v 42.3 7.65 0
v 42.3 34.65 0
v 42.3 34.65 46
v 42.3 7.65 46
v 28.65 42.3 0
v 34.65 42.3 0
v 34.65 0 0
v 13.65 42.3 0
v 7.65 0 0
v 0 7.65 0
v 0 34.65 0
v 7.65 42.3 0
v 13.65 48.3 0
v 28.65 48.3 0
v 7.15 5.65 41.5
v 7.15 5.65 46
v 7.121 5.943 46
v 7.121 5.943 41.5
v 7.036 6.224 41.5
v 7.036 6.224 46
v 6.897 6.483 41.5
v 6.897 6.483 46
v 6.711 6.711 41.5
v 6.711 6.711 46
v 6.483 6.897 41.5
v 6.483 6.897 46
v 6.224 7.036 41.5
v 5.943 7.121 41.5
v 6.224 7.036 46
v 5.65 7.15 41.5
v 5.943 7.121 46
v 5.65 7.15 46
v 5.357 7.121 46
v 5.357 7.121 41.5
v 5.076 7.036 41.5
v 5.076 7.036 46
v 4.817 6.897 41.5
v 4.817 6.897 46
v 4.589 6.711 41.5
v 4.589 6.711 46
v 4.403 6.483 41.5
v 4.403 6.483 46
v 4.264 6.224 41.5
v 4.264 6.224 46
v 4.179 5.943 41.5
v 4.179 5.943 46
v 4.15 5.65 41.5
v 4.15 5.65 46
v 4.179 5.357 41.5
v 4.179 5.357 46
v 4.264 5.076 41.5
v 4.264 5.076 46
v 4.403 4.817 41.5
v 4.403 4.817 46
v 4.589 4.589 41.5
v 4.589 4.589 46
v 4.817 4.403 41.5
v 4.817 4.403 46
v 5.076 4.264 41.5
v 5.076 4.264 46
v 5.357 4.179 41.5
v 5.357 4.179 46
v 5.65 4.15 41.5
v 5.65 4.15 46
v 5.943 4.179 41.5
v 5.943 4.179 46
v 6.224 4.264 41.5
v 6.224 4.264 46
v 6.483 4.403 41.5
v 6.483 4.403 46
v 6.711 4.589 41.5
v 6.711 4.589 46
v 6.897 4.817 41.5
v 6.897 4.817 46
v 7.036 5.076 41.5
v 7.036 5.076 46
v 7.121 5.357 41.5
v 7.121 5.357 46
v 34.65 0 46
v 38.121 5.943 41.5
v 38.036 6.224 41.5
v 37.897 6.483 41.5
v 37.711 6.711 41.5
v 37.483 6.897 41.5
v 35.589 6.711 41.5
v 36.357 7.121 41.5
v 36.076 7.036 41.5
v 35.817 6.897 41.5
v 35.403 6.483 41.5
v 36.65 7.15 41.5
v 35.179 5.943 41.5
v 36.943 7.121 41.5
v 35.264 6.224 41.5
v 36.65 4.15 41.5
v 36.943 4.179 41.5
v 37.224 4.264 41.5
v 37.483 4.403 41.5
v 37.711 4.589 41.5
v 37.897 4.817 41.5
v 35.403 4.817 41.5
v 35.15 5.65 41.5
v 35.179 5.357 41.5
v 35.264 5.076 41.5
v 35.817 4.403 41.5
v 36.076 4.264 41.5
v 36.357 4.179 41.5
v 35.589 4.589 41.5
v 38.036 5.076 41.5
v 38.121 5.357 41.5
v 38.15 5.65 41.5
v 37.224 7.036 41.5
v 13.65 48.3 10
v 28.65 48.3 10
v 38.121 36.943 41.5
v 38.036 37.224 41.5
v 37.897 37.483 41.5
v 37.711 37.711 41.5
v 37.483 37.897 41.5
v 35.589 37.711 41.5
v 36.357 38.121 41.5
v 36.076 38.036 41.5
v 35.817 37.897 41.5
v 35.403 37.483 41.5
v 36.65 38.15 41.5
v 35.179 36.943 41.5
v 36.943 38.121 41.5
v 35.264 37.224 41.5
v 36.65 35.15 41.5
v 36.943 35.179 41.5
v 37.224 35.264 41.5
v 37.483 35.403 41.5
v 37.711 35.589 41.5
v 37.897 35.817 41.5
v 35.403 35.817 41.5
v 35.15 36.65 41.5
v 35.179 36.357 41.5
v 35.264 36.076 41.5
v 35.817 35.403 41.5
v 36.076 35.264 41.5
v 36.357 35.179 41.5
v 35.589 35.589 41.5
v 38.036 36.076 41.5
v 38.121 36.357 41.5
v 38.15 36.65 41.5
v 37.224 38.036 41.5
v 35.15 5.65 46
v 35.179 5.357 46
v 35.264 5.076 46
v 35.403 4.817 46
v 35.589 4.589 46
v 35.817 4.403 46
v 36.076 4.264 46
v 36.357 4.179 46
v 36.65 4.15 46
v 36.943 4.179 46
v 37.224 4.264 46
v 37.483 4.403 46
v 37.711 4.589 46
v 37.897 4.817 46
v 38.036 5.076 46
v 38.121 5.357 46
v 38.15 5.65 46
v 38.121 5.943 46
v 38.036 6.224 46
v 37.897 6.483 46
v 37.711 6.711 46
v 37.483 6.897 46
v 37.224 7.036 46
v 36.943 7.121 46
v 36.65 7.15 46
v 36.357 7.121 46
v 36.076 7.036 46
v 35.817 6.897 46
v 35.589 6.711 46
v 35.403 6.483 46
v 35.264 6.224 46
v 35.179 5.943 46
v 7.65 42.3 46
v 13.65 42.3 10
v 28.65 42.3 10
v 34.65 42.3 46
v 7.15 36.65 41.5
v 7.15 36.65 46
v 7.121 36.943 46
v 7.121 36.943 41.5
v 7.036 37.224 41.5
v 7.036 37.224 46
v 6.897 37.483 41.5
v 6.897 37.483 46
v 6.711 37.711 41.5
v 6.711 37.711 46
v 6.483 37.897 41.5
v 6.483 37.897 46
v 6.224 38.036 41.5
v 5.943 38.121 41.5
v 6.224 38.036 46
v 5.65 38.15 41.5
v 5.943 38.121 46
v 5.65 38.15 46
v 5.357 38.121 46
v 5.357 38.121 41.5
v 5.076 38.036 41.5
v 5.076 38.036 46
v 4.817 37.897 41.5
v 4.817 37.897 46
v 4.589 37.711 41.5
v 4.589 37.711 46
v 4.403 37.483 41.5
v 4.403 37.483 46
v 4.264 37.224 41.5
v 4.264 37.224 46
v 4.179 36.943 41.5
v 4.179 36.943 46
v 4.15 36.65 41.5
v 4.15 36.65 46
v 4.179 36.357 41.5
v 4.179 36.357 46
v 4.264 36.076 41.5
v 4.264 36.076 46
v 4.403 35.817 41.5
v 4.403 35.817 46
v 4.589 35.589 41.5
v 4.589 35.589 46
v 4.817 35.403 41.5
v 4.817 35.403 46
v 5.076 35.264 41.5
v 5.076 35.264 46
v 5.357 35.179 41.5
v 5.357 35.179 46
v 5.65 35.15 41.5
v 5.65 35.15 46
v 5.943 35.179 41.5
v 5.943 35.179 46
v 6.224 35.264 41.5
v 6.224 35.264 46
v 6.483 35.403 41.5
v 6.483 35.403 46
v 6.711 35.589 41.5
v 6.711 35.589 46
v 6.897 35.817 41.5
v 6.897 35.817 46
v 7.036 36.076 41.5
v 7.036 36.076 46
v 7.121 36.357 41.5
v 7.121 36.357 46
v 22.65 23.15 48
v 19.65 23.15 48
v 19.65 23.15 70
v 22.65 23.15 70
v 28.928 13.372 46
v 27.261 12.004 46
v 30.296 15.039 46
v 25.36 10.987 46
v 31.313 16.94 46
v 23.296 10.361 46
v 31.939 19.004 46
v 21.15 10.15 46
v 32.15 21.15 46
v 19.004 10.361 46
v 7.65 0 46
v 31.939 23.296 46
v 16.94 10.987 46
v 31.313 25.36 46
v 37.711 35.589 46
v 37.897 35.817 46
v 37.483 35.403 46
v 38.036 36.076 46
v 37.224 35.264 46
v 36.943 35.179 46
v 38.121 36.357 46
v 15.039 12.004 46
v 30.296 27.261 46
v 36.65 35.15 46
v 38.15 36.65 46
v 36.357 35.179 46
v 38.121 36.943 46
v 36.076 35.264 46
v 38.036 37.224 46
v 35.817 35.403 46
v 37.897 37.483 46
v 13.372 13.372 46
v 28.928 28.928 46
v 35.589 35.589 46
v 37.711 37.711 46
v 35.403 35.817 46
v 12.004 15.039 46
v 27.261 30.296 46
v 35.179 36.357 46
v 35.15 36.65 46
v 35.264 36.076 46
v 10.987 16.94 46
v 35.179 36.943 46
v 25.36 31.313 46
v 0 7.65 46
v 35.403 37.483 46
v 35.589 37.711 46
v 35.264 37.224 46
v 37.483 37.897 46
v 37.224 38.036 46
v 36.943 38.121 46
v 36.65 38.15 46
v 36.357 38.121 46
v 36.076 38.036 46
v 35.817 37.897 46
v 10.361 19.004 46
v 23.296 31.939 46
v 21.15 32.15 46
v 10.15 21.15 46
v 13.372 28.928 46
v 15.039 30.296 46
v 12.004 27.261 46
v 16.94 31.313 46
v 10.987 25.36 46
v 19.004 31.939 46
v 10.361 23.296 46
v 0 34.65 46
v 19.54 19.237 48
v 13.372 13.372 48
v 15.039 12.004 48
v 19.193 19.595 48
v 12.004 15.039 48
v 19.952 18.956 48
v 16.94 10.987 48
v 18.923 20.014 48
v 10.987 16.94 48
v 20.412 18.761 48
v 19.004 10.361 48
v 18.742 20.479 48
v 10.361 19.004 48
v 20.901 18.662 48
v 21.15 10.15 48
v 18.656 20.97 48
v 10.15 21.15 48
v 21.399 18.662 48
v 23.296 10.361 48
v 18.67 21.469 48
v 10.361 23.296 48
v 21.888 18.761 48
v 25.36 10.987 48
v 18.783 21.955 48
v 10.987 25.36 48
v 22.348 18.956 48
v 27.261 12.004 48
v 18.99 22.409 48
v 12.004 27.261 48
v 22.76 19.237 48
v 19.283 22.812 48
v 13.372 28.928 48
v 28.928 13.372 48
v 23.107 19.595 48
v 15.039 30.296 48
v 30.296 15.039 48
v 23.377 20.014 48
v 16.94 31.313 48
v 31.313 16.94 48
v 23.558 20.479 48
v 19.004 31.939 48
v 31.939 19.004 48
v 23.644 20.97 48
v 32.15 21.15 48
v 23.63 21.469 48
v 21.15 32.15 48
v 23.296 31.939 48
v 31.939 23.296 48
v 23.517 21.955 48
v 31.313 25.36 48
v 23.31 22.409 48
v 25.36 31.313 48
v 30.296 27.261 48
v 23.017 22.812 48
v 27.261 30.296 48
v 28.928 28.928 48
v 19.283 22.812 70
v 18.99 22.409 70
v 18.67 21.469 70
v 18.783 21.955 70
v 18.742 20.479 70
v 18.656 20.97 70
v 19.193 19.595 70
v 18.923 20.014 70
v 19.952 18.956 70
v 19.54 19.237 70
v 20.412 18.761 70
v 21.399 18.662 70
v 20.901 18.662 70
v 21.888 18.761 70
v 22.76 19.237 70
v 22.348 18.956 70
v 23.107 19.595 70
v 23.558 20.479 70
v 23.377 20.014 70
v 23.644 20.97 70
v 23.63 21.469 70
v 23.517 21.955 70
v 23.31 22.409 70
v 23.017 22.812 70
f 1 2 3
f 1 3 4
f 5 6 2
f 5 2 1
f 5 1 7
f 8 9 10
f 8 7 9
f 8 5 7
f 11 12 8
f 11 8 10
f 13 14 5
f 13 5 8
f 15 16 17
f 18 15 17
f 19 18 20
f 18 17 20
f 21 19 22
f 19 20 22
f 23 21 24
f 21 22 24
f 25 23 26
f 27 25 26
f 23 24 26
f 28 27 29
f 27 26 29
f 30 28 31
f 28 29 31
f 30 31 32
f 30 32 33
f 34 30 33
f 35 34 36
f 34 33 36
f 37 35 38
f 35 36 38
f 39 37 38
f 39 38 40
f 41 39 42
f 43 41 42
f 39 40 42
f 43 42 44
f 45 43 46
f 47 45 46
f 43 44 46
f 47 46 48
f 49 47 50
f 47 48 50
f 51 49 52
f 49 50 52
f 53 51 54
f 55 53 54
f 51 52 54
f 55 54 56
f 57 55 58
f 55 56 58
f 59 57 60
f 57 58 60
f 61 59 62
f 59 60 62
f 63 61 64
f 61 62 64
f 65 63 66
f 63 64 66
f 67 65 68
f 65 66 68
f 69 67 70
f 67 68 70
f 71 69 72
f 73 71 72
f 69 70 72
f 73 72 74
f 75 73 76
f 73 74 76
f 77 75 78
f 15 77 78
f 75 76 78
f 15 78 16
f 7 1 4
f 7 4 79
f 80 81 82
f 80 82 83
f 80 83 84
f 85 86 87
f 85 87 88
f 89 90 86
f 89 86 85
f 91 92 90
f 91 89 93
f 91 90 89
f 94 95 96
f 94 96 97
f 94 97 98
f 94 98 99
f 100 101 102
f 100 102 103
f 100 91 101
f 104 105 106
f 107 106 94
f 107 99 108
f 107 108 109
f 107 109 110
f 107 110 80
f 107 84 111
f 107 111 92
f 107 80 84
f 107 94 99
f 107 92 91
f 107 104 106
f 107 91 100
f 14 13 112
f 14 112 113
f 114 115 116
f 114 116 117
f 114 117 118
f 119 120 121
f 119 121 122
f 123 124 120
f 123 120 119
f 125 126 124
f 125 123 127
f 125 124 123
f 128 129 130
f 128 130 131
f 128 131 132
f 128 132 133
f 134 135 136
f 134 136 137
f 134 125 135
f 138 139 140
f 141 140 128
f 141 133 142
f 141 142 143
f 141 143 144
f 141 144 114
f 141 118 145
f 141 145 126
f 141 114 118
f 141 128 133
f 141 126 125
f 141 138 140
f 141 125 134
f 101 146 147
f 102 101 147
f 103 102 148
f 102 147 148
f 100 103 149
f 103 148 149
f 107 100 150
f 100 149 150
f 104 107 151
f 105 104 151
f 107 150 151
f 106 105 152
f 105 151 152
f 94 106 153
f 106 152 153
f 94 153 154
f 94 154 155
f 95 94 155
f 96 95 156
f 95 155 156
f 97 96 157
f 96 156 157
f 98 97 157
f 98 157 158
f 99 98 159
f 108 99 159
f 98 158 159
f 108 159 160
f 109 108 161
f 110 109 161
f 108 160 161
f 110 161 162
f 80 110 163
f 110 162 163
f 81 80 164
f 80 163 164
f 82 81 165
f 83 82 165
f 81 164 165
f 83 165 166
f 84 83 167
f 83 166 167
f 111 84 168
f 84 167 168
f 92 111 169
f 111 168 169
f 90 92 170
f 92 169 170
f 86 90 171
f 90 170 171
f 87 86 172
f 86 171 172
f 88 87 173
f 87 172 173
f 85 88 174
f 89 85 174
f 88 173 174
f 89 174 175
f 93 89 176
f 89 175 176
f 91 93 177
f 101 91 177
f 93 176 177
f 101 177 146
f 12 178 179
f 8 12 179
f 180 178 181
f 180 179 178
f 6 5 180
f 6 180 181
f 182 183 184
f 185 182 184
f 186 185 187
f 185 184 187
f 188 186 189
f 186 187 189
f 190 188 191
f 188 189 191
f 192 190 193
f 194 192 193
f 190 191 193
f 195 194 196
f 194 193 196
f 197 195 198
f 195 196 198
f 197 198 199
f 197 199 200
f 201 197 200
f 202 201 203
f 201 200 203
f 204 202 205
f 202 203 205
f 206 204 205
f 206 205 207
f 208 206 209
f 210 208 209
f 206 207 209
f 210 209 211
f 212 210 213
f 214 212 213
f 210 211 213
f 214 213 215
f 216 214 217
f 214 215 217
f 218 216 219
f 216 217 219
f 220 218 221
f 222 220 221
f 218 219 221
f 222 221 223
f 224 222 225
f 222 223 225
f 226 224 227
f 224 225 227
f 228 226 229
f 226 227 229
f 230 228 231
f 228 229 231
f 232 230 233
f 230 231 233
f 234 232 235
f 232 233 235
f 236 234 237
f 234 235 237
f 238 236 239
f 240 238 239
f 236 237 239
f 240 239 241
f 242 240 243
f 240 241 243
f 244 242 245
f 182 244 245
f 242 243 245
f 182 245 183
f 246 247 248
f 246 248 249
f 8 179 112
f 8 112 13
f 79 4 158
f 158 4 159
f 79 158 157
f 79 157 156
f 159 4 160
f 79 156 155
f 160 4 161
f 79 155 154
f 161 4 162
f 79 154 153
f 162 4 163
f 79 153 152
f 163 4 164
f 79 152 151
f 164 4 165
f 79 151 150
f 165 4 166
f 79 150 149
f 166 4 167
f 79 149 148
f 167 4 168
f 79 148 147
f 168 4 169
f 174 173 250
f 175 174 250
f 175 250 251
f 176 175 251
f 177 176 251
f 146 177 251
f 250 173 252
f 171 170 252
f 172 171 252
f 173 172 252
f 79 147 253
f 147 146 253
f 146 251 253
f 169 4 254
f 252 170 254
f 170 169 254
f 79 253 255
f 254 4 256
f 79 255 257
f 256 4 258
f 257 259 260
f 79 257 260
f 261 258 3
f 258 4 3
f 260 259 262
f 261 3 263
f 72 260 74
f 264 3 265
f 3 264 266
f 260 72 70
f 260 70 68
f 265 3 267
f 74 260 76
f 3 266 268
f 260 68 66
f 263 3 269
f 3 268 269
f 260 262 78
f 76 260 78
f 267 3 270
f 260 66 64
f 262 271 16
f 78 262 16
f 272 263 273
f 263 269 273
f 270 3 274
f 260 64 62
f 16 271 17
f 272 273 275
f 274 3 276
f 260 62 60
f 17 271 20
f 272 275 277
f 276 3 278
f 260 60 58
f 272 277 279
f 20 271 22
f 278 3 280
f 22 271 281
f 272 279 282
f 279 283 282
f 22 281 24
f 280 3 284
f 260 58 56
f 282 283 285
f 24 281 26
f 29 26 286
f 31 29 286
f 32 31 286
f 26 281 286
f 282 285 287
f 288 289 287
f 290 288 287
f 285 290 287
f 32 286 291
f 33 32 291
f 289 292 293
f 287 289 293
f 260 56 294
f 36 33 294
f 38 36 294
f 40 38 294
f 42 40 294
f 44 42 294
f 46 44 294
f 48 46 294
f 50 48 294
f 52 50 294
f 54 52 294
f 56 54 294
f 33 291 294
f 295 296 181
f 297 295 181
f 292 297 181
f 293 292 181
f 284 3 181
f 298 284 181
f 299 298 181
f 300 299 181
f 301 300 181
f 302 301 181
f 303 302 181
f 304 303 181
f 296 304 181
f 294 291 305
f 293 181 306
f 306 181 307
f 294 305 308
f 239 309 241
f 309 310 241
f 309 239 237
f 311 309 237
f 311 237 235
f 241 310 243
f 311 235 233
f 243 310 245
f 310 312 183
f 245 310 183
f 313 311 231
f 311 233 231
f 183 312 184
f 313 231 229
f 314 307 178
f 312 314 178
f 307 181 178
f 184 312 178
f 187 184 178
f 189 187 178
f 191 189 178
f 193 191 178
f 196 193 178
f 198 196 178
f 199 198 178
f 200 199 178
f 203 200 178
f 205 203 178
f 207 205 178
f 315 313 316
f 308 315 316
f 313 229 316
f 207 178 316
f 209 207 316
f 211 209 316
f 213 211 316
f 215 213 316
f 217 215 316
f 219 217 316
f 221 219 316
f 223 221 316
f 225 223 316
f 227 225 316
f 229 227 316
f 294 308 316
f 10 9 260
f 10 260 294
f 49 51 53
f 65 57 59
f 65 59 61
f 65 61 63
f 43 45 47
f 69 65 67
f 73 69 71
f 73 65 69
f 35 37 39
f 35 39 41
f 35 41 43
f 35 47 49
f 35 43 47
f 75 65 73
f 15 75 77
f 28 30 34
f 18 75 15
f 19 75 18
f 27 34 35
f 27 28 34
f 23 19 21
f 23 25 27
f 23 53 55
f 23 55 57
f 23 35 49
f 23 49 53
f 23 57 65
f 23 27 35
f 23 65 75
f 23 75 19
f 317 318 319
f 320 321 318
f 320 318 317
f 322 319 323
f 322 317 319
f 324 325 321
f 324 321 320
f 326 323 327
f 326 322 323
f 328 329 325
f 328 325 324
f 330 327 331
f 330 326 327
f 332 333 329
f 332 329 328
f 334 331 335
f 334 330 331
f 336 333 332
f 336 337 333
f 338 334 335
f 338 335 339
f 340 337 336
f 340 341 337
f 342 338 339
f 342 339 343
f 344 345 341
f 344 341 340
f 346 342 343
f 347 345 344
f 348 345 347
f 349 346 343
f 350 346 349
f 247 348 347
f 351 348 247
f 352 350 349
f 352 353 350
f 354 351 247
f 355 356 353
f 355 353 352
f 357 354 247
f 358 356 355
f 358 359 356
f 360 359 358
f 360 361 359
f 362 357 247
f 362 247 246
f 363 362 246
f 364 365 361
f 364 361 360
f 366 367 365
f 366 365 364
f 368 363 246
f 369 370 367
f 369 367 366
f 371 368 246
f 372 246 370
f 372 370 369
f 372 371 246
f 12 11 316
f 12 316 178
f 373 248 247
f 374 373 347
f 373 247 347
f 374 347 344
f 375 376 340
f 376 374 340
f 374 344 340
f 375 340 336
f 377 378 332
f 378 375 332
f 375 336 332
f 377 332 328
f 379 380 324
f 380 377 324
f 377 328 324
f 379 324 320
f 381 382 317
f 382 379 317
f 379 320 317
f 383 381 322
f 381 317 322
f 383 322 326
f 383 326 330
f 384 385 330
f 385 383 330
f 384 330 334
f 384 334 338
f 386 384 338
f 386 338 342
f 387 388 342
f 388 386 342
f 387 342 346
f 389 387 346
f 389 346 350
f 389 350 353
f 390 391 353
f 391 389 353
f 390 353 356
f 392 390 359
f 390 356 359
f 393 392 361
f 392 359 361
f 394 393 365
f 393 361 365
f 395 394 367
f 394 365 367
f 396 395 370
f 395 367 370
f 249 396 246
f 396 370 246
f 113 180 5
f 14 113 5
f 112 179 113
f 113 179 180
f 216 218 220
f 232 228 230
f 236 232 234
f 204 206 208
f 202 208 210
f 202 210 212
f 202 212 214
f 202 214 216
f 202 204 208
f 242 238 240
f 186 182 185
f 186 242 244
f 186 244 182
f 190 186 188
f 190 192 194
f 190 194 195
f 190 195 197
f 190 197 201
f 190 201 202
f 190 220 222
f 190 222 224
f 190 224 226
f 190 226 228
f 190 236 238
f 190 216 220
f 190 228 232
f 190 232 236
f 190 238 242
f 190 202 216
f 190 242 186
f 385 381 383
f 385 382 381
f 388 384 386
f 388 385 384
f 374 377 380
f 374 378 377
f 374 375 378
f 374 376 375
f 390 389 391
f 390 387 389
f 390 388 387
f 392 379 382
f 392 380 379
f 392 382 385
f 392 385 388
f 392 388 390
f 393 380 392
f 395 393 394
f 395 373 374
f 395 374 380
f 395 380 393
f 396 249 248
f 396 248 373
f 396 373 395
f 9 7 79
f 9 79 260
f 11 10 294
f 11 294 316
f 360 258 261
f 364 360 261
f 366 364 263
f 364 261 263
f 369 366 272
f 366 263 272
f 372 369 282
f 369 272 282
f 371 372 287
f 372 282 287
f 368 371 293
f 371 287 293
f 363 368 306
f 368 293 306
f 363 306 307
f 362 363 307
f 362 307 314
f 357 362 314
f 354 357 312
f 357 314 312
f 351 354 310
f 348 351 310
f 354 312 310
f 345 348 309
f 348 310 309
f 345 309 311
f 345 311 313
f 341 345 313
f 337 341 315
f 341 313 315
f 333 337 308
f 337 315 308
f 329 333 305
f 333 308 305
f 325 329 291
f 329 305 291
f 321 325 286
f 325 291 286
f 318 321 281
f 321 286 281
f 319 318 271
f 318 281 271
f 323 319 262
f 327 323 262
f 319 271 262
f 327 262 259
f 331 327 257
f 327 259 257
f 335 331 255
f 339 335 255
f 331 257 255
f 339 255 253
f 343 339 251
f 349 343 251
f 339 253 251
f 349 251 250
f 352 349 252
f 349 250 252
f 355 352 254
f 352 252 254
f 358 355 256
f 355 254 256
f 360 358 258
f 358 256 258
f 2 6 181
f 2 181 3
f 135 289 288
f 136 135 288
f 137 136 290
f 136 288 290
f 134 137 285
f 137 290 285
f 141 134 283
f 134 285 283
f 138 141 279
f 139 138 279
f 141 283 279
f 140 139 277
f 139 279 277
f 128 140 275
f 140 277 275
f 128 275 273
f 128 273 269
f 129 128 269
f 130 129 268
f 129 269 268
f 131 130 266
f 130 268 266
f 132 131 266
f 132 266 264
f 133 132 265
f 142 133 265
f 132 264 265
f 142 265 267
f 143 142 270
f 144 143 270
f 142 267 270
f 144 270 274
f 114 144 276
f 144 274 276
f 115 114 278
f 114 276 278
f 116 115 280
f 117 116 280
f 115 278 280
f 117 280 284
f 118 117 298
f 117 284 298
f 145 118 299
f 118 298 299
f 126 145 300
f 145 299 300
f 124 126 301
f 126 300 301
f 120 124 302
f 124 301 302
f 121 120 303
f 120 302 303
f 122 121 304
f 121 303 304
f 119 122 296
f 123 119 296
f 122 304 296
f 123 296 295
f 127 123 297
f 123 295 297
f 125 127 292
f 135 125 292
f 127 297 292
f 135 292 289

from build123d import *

# Parameters (mm, degrees)
BOSS_EXTRUDE1_DEPTH = 46
SKETCH3_R           = 11
BOSS_EXTRUDE2_DEPTH = 2
SKETCH4_R           = 2.5
BOSS_EXTRUDE3_DEPTH = 22
CUT_EXTRUDE1_START  = -22
CUT_EXTRUDE1_DEPTH  = 22
SKETCH6_R           = 1.5
CUT_EXTRUDE2_DEPTH  = 4.5
SKETCH7_W           = 15
SKETCH7_H           = 10
BOSS_EXTRUDE4_DEPTH = 6


with BuildPart() as part:
    # Sketch1 → Boss-Extrude1 (new body)
    with BuildSketch(Plane.XY):
        Polygon((7.65, 0), (0, 7.65), (0, 34.65), (7.65, 42.3), (34.65, 42.3), (42.3, 34.65), (42.3, 7.65), (34.65, 0), align=None)
    extrude(amount=BOSS_EXTRUDE1_DEPTH)

    # Sketch3 → Boss-Extrude2 (add)
    with BuildSketch(Plane.XY.offset(46)):
        with Locations((21.15, 21.15)):
            Circle(SKETCH3_R)
    extrude(amount=BOSS_EXTRUDE2_DEPTH)

    # Sketch4 → Boss-Extrude3 (add)
    with BuildSketch(Plane.XY.offset(48)):
        with Locations((21.15, 21.15)):
            Circle(SKETCH4_R)
    extrude(amount=BOSS_EXTRUDE3_DEPTH)

    # Sketch5 → Cut-Extrude1 (cut)
    with BuildSketch(Plane.XY.offset(70).offset(CUT_EXTRUDE1_START)):
        with BuildLine():
            Line((21.15, 23.15), (22.65, 23.15))
            ThreePointArc((22.65, 23.15), (21.15, 23.65), (19.65, 23.15))
            Line((19.65, 23.15), (21.15, 23.15))
        make_face()
    extrude(amount=CUT_EXTRUDE1_DEPTH, mode=Mode.SUBTRACT)

    # Sketch6 → Cut-Extrude2 (cut)
    with BuildSketch(Plane.XY.offset(46)):
        with Locations((5.65, 5.65)):
            Circle(SKETCH6_R)
        with Locations((5.65, 36.65)):
            Circle(SKETCH6_R)
        with Locations(Location((36.65, 5.65, 0), (0, 0, 180))):
            Circle(SKETCH6_R)
        with Locations(Location((36.65, 36.65, 0), (0, 0, 180))):
            Circle(SKETCH6_R)
    extrude(amount=-CUT_EXTRUDE2_DEPTH, mode=Mode.SUBTRACT)

    # Sketch7 → Boss-Extrude4 (add)
    with BuildSketch(Plane(origin=(0, 42.3, 0), x_dir=(1, 0, 0), z_dir=(0, 1, 0))):
        with Locations((21.15, -5)):
            Rectangle(SKETCH7_W, SKETCH7_H)
    extrude(amount=BOSS_EXTRUDE4_DEPTH)


solid = part.part
